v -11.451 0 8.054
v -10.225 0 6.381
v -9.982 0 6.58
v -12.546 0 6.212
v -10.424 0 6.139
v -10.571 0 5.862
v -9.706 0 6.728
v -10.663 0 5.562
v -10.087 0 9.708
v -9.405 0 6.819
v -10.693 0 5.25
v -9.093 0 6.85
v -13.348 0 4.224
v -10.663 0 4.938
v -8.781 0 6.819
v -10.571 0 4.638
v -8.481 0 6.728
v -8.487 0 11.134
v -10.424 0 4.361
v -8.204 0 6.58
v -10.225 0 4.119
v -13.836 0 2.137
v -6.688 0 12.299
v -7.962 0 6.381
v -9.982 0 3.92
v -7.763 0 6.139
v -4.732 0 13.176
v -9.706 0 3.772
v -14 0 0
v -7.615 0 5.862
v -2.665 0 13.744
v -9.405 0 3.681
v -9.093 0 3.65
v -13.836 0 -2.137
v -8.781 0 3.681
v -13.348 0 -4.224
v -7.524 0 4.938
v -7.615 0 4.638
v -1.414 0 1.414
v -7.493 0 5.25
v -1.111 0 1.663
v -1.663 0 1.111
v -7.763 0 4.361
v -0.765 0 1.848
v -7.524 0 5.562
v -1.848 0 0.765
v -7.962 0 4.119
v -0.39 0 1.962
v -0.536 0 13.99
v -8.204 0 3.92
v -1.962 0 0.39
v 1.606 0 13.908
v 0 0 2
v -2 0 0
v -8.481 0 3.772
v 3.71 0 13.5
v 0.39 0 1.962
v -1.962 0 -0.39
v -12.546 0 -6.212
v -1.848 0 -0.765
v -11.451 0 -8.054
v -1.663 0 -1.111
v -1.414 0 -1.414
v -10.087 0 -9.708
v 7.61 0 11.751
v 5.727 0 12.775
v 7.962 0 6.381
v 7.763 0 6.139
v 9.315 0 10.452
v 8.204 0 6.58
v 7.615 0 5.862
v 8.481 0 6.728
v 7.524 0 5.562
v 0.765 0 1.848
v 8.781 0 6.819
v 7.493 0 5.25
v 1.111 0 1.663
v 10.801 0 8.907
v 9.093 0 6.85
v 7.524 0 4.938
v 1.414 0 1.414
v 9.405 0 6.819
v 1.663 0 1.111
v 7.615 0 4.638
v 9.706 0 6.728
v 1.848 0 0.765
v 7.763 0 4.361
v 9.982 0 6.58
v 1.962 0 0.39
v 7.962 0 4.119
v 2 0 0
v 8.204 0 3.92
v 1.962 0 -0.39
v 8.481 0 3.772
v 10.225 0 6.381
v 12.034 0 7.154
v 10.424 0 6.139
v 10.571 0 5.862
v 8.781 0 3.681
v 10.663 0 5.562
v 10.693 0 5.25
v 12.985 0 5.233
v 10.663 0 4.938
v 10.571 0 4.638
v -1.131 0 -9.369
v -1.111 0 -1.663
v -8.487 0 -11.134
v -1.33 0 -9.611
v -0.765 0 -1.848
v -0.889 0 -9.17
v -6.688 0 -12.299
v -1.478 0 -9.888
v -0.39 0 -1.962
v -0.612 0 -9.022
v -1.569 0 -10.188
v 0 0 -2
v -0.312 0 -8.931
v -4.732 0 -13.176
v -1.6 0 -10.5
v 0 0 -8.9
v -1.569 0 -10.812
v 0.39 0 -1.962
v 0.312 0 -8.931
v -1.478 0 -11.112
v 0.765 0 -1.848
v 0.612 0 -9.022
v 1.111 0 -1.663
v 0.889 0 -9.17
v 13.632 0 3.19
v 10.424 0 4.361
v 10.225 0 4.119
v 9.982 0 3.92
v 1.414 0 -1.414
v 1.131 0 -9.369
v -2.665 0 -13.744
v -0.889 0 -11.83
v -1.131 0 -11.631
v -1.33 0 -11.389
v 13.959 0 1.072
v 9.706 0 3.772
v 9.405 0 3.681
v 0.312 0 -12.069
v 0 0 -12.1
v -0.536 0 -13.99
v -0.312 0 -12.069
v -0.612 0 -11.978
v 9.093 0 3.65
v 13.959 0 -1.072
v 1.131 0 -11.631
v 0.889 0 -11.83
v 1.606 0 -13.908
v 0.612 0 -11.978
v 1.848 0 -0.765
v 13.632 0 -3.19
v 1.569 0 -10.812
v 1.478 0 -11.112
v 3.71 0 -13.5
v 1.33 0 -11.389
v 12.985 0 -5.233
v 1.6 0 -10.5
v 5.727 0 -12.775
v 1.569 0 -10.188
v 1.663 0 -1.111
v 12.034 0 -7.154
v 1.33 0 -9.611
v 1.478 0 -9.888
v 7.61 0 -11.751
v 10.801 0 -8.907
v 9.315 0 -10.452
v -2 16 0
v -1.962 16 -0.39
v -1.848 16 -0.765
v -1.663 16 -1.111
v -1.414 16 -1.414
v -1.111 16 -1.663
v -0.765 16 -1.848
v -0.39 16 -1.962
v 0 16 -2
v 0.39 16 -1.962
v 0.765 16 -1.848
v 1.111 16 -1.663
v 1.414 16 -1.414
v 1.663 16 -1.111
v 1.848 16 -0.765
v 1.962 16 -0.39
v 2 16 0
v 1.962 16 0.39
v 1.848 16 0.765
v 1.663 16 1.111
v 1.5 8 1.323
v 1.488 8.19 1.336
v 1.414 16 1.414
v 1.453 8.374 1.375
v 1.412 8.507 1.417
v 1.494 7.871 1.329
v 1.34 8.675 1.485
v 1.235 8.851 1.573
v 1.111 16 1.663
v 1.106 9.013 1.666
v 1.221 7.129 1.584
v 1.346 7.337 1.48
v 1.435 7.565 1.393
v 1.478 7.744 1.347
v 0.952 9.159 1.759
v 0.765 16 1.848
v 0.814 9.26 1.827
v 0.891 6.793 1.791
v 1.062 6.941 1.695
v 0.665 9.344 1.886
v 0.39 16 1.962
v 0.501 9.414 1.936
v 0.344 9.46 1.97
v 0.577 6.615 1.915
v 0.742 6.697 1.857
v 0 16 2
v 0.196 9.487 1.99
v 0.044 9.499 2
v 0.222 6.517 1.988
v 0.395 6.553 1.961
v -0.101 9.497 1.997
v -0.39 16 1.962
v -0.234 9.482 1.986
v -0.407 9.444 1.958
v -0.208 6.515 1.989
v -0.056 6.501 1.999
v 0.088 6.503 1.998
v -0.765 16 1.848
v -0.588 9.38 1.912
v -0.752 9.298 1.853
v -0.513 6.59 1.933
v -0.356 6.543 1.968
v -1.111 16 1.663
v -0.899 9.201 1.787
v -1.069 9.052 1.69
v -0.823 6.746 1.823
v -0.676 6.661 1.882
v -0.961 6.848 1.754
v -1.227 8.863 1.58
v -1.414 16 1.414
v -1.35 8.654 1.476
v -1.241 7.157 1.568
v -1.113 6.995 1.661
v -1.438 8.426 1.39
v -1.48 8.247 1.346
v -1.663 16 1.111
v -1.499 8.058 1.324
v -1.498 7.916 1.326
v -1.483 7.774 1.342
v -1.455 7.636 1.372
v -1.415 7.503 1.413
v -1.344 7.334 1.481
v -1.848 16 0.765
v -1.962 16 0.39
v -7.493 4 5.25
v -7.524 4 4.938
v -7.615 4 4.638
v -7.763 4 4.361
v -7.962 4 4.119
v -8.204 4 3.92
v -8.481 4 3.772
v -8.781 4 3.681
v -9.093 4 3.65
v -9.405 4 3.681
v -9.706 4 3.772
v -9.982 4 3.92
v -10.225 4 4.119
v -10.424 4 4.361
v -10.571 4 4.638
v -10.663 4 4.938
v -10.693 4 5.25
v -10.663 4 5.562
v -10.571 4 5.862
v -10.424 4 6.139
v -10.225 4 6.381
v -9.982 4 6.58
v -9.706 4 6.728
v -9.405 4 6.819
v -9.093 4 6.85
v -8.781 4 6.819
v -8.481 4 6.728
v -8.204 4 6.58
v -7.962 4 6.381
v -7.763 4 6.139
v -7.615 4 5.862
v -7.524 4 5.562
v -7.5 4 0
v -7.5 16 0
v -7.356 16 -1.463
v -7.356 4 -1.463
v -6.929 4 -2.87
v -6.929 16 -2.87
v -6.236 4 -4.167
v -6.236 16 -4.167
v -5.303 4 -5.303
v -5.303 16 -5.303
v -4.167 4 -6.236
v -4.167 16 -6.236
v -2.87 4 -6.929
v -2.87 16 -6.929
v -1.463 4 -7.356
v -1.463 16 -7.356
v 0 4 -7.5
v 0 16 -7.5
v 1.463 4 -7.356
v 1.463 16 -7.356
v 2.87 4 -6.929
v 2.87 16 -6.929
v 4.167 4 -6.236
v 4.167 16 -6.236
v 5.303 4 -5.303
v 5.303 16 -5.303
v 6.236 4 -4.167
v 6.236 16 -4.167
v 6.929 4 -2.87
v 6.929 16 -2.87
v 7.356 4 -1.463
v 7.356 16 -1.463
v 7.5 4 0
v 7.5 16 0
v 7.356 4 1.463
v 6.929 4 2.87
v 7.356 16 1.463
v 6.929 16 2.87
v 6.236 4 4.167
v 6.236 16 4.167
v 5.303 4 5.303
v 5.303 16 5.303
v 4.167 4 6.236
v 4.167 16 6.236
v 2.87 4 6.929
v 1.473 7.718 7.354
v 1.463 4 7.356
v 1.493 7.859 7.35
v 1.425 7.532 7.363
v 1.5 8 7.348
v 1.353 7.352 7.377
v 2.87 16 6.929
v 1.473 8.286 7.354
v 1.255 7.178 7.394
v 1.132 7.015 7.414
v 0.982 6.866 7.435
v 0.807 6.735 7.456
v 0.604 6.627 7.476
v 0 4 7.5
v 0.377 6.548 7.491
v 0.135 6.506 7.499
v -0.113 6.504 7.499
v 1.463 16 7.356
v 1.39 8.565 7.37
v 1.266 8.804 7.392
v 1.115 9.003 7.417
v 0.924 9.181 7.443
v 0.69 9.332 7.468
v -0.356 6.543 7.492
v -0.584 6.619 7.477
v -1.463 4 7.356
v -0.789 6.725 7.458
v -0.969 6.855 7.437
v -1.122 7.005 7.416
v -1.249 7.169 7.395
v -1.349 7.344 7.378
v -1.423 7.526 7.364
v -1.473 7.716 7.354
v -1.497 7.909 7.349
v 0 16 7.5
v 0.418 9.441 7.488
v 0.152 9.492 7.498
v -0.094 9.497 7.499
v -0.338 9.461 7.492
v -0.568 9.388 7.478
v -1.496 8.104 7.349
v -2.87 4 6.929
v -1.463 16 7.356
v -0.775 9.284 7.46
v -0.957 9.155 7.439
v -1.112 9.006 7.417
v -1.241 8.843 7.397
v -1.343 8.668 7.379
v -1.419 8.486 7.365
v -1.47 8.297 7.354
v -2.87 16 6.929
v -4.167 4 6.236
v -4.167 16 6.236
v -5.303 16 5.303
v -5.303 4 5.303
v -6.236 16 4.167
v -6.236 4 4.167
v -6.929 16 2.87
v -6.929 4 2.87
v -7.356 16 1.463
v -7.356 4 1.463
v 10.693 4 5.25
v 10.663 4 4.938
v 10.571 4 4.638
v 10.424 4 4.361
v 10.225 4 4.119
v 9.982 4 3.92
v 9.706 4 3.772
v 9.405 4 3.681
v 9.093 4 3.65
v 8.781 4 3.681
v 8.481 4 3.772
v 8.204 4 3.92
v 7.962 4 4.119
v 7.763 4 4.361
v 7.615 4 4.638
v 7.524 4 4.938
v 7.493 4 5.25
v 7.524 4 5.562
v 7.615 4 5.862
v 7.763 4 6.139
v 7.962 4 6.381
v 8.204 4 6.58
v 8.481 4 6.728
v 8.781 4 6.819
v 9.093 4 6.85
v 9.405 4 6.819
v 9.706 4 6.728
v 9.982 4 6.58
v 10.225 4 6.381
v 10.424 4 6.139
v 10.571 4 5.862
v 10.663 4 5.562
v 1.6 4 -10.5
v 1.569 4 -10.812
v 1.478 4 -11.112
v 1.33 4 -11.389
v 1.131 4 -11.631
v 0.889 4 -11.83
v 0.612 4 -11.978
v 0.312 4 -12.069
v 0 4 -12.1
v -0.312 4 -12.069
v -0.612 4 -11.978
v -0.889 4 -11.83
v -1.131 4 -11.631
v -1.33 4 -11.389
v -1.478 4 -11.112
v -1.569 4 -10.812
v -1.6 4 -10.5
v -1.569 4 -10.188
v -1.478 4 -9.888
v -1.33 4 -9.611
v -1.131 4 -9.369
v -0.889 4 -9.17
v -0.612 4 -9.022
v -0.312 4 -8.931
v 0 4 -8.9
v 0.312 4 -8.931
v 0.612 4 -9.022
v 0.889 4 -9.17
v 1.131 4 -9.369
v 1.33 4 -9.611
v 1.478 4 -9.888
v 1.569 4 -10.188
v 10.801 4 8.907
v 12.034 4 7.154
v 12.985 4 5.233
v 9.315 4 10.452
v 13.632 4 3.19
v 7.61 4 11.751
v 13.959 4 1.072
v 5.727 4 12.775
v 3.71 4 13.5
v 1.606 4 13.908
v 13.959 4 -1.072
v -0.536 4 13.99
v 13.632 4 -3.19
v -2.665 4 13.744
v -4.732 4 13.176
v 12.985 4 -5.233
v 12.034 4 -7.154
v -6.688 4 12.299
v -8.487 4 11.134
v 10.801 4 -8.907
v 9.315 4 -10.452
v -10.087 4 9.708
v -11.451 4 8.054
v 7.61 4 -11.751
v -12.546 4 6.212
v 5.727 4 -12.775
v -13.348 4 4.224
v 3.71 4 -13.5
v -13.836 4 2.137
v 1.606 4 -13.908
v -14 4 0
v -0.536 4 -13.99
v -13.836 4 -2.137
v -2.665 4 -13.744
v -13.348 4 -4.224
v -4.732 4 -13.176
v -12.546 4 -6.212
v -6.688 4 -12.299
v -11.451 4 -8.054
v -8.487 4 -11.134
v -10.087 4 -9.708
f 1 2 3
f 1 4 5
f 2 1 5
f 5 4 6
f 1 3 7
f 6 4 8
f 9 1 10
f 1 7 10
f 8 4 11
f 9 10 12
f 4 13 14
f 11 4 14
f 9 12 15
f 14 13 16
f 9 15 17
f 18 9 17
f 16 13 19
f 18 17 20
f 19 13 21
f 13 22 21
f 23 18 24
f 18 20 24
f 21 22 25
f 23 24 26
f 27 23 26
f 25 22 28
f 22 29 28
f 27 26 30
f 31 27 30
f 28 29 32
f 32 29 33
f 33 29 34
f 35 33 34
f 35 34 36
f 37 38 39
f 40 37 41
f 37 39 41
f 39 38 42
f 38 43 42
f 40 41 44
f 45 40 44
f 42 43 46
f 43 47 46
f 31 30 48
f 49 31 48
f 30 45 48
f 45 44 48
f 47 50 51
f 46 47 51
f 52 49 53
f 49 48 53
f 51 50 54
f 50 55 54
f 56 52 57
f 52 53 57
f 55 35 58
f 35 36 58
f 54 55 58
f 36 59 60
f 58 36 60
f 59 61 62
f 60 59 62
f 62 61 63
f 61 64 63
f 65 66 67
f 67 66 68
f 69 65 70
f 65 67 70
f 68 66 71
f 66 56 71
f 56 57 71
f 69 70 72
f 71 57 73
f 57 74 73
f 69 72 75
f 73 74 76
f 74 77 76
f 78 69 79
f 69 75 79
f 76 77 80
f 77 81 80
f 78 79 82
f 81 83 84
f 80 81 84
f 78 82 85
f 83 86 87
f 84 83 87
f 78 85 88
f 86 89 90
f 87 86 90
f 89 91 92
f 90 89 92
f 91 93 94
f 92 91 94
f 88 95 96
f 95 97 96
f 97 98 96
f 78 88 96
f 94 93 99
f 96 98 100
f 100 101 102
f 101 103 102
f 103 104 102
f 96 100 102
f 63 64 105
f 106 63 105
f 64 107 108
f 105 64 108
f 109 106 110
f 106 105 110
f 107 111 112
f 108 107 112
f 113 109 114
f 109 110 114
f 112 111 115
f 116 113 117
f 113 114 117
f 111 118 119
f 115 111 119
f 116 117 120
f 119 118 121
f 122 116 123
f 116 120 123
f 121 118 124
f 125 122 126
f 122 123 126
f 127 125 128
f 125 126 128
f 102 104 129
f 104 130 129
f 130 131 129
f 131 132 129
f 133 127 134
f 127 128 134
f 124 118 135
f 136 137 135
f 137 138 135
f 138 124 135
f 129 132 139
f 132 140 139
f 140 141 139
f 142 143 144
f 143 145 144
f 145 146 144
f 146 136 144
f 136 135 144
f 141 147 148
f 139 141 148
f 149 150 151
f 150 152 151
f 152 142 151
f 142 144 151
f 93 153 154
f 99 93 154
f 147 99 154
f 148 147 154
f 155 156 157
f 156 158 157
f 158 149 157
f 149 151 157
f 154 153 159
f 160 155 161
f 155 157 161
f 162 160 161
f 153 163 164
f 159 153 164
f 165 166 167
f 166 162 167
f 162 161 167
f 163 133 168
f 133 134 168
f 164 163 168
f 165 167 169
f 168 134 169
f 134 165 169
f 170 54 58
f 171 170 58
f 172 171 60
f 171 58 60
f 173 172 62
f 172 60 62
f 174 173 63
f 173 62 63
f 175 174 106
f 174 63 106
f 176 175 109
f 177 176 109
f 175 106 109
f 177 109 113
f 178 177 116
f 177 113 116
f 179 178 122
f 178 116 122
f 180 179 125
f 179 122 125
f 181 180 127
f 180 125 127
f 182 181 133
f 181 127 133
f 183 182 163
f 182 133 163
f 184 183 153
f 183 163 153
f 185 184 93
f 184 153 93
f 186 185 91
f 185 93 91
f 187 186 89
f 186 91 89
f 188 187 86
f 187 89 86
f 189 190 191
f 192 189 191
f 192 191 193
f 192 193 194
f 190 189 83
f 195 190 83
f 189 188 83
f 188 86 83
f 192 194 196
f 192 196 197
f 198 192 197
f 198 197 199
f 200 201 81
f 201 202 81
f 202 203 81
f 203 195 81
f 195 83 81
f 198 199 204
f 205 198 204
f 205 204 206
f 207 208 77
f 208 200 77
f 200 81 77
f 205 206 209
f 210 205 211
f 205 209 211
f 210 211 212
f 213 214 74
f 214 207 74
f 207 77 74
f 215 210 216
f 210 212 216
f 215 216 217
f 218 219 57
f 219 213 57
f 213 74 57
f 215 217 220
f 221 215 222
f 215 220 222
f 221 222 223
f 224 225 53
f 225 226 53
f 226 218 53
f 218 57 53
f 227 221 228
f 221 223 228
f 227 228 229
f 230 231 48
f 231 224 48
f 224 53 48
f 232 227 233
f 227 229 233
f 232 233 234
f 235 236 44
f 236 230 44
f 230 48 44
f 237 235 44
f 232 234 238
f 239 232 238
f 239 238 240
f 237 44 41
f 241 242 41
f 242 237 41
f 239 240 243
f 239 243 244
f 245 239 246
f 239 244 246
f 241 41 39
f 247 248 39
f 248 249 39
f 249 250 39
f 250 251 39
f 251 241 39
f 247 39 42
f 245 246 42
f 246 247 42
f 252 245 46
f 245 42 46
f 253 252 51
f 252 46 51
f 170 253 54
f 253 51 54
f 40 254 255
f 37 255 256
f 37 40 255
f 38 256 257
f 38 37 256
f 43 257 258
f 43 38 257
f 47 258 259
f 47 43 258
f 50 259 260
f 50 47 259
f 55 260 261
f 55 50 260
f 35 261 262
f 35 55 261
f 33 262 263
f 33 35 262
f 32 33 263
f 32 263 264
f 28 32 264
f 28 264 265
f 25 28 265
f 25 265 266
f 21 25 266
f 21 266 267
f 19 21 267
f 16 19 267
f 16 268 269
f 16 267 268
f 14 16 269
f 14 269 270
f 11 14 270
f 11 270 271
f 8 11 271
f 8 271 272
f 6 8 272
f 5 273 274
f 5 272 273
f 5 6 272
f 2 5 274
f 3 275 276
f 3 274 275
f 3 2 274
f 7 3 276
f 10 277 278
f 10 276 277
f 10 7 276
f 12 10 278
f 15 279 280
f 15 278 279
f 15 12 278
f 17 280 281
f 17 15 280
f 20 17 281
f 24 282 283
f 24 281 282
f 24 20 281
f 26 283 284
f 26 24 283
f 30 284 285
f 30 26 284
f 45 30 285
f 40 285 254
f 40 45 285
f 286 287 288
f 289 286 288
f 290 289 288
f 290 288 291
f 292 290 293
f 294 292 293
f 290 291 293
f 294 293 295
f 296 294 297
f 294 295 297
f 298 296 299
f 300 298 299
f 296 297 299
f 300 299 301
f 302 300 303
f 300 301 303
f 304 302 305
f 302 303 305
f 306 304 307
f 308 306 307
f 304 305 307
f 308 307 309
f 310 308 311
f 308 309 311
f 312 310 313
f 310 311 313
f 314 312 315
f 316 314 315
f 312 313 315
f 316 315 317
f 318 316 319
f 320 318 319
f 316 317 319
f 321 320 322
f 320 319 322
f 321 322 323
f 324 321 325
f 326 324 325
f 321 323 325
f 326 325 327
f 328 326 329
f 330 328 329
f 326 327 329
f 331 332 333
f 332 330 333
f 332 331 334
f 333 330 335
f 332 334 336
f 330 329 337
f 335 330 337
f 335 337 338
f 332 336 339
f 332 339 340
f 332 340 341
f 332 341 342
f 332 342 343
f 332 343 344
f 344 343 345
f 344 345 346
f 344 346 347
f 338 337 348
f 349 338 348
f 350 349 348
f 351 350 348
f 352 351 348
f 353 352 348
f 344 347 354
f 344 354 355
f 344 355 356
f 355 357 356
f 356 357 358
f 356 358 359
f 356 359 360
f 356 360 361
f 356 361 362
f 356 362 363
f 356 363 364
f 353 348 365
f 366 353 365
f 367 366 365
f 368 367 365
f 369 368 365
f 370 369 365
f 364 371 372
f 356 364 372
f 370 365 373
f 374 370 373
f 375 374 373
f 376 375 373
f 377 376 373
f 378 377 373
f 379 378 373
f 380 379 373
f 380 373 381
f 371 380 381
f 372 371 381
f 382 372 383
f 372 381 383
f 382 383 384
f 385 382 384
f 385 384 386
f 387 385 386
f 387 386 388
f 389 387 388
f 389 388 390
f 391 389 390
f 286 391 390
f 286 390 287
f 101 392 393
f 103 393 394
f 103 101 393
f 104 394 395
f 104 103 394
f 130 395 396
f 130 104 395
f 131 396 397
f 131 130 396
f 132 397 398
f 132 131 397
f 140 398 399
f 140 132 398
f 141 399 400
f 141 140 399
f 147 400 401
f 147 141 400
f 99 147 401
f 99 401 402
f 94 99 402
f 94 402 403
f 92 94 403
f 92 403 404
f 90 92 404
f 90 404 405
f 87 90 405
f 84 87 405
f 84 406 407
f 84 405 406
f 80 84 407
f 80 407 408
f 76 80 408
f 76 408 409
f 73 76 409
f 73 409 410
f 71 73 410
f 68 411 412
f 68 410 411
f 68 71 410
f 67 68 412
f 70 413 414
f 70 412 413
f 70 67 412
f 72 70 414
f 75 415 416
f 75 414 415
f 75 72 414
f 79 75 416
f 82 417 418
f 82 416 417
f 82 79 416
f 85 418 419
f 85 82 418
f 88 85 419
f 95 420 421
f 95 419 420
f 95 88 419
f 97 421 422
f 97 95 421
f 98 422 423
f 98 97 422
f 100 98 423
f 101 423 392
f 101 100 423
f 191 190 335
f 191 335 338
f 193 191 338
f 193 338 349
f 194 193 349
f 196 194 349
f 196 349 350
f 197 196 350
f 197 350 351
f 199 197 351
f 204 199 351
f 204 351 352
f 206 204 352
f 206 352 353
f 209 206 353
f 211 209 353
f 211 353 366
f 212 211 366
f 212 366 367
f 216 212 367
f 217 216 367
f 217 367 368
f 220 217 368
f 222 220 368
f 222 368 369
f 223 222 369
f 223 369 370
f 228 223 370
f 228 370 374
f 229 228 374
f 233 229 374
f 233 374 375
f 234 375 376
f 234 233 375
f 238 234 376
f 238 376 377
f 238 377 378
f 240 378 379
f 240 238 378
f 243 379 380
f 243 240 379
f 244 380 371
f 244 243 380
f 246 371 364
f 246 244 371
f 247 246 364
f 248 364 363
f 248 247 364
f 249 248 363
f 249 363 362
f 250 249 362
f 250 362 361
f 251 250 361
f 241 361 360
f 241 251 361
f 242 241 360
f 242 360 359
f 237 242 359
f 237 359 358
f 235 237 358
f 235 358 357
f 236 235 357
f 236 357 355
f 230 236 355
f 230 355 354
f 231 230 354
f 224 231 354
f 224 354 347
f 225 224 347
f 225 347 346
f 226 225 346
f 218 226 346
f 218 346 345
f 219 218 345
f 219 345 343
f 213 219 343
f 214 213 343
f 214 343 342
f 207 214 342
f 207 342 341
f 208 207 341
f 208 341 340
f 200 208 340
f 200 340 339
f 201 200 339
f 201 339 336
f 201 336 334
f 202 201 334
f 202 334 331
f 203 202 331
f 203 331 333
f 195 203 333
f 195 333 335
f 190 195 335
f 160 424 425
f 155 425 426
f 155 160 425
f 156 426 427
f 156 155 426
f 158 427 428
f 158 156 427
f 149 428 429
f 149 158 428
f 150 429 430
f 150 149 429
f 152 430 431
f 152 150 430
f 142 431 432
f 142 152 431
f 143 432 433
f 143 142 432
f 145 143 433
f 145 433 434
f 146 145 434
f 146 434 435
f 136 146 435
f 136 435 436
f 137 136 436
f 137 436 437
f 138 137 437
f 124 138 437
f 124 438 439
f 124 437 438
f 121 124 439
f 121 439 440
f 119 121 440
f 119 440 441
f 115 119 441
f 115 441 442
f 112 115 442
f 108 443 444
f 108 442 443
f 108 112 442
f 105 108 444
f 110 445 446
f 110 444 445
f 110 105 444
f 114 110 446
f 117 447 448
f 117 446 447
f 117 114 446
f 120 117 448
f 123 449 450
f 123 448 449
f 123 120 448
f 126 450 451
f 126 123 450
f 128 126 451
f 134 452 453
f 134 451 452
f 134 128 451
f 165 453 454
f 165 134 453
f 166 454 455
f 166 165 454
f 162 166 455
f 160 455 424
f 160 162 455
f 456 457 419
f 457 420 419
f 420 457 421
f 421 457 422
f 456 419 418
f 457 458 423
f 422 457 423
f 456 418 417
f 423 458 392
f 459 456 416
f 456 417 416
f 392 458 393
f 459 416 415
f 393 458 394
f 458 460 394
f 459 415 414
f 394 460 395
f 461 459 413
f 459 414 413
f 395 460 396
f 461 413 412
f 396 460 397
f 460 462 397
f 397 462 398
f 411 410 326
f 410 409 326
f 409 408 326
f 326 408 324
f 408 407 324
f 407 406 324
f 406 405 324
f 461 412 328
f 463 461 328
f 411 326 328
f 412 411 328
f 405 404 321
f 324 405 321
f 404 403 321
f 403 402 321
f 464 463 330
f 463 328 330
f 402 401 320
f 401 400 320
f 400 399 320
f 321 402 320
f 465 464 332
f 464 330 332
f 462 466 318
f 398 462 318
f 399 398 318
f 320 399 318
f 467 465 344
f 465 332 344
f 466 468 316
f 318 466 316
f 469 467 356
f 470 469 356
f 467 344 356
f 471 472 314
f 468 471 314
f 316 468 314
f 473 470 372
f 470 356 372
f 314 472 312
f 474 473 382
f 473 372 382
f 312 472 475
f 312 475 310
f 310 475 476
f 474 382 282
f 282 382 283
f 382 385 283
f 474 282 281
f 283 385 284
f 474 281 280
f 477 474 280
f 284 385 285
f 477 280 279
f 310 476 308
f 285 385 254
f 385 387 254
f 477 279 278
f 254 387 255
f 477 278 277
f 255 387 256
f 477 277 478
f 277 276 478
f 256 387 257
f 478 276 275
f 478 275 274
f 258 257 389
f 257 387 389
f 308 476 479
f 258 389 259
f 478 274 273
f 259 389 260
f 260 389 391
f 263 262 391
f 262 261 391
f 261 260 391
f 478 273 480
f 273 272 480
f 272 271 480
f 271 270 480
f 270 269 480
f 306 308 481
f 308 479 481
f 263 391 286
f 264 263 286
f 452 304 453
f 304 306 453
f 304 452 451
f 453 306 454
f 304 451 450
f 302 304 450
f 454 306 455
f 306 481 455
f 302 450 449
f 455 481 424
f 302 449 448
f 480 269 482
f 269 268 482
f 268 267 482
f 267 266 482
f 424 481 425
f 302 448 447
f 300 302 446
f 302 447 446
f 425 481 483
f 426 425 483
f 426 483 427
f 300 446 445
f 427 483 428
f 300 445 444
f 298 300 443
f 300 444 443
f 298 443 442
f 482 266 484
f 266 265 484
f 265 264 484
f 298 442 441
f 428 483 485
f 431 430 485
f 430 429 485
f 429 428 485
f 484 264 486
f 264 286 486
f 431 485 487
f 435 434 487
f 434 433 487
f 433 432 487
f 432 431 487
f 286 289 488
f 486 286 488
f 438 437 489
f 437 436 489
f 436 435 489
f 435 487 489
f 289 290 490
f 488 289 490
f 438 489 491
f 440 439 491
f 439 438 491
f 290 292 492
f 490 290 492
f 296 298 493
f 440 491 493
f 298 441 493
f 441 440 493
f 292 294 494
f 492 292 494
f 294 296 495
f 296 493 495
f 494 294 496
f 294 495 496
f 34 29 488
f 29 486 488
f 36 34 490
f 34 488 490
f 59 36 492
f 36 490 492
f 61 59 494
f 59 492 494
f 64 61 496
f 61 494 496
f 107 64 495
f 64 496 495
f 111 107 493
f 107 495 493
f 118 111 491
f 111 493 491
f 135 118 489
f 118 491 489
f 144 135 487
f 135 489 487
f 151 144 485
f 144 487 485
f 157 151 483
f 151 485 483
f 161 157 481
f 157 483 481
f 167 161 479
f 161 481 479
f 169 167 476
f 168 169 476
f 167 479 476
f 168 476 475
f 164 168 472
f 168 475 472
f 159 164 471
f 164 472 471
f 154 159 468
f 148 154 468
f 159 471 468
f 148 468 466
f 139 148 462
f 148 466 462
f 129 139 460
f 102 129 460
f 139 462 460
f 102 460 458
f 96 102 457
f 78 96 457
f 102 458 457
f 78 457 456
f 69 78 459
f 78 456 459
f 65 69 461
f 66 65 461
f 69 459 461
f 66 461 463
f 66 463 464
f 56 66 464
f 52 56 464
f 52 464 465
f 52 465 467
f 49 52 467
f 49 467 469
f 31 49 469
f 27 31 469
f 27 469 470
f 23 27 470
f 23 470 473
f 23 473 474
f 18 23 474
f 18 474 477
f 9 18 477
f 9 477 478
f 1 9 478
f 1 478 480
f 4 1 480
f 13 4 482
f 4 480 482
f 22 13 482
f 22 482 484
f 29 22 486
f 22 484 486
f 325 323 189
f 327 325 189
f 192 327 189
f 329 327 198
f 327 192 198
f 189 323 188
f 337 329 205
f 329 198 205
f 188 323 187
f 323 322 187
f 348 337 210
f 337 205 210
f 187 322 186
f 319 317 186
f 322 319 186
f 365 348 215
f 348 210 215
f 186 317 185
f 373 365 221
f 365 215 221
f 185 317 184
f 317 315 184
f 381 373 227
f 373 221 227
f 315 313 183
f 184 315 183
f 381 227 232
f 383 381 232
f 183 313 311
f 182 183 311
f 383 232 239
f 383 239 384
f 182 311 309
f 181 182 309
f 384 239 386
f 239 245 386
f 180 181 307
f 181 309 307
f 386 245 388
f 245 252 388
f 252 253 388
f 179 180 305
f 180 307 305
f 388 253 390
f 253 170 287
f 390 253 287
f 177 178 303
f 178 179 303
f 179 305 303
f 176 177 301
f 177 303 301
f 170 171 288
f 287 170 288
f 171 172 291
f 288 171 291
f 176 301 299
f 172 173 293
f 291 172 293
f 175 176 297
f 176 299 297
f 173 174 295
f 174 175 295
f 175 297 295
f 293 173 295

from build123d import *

# Parameters (mm, degrees)
SKETCH2_R          = 1.6
CUT_EXTRUDE1_DEPTH = 17
SKETCH3_R          = 1.5
CUT_EXTRUDE2_DEPTH = 15


with BuildPart() as part:
    # Sketch1 → Revolve1 (revolve)
    with BuildSketch(Plane.XY):
        Polygon((-14, 0), (-14, 4), (-7.5, 4), (-7.5, 16), (-2, 16), (-2, 0), align=None)
    revolve(axis=Axis((0, 0, 0), (0, -1, 0)))

    # Sketch2 → Cut-Extrude1 (cut, through all)
    with BuildSketch(Plane(origin=(0, 0, 0), x_dir=(1, 0, 0), z_dir=(0, 1, 0))):
        with Locations((0, 10.5)):
            Circle(SKETCH2_R)
        with Locations((9.09326674, -5.25)):
            Circle(SKETCH2_R)
        with Locations((-9.09326674, -5.25)):
            Circle(SKETCH2_R)
    extrude(amount=CUT_EXTRUDE1_DEPTH, mode=Mode.SUBTRACT)

    # Sketch3 → Cut-Extrude2 (cut, through all)
    with BuildSketch(Plane.XY):
        with Locations((0, 8)):
            Circle(SKETCH3_R)
    extrude(amount=CUT_EXTRUDE2_DEPTH, mode=Mode.SUBTRACT)


solid = part.part
